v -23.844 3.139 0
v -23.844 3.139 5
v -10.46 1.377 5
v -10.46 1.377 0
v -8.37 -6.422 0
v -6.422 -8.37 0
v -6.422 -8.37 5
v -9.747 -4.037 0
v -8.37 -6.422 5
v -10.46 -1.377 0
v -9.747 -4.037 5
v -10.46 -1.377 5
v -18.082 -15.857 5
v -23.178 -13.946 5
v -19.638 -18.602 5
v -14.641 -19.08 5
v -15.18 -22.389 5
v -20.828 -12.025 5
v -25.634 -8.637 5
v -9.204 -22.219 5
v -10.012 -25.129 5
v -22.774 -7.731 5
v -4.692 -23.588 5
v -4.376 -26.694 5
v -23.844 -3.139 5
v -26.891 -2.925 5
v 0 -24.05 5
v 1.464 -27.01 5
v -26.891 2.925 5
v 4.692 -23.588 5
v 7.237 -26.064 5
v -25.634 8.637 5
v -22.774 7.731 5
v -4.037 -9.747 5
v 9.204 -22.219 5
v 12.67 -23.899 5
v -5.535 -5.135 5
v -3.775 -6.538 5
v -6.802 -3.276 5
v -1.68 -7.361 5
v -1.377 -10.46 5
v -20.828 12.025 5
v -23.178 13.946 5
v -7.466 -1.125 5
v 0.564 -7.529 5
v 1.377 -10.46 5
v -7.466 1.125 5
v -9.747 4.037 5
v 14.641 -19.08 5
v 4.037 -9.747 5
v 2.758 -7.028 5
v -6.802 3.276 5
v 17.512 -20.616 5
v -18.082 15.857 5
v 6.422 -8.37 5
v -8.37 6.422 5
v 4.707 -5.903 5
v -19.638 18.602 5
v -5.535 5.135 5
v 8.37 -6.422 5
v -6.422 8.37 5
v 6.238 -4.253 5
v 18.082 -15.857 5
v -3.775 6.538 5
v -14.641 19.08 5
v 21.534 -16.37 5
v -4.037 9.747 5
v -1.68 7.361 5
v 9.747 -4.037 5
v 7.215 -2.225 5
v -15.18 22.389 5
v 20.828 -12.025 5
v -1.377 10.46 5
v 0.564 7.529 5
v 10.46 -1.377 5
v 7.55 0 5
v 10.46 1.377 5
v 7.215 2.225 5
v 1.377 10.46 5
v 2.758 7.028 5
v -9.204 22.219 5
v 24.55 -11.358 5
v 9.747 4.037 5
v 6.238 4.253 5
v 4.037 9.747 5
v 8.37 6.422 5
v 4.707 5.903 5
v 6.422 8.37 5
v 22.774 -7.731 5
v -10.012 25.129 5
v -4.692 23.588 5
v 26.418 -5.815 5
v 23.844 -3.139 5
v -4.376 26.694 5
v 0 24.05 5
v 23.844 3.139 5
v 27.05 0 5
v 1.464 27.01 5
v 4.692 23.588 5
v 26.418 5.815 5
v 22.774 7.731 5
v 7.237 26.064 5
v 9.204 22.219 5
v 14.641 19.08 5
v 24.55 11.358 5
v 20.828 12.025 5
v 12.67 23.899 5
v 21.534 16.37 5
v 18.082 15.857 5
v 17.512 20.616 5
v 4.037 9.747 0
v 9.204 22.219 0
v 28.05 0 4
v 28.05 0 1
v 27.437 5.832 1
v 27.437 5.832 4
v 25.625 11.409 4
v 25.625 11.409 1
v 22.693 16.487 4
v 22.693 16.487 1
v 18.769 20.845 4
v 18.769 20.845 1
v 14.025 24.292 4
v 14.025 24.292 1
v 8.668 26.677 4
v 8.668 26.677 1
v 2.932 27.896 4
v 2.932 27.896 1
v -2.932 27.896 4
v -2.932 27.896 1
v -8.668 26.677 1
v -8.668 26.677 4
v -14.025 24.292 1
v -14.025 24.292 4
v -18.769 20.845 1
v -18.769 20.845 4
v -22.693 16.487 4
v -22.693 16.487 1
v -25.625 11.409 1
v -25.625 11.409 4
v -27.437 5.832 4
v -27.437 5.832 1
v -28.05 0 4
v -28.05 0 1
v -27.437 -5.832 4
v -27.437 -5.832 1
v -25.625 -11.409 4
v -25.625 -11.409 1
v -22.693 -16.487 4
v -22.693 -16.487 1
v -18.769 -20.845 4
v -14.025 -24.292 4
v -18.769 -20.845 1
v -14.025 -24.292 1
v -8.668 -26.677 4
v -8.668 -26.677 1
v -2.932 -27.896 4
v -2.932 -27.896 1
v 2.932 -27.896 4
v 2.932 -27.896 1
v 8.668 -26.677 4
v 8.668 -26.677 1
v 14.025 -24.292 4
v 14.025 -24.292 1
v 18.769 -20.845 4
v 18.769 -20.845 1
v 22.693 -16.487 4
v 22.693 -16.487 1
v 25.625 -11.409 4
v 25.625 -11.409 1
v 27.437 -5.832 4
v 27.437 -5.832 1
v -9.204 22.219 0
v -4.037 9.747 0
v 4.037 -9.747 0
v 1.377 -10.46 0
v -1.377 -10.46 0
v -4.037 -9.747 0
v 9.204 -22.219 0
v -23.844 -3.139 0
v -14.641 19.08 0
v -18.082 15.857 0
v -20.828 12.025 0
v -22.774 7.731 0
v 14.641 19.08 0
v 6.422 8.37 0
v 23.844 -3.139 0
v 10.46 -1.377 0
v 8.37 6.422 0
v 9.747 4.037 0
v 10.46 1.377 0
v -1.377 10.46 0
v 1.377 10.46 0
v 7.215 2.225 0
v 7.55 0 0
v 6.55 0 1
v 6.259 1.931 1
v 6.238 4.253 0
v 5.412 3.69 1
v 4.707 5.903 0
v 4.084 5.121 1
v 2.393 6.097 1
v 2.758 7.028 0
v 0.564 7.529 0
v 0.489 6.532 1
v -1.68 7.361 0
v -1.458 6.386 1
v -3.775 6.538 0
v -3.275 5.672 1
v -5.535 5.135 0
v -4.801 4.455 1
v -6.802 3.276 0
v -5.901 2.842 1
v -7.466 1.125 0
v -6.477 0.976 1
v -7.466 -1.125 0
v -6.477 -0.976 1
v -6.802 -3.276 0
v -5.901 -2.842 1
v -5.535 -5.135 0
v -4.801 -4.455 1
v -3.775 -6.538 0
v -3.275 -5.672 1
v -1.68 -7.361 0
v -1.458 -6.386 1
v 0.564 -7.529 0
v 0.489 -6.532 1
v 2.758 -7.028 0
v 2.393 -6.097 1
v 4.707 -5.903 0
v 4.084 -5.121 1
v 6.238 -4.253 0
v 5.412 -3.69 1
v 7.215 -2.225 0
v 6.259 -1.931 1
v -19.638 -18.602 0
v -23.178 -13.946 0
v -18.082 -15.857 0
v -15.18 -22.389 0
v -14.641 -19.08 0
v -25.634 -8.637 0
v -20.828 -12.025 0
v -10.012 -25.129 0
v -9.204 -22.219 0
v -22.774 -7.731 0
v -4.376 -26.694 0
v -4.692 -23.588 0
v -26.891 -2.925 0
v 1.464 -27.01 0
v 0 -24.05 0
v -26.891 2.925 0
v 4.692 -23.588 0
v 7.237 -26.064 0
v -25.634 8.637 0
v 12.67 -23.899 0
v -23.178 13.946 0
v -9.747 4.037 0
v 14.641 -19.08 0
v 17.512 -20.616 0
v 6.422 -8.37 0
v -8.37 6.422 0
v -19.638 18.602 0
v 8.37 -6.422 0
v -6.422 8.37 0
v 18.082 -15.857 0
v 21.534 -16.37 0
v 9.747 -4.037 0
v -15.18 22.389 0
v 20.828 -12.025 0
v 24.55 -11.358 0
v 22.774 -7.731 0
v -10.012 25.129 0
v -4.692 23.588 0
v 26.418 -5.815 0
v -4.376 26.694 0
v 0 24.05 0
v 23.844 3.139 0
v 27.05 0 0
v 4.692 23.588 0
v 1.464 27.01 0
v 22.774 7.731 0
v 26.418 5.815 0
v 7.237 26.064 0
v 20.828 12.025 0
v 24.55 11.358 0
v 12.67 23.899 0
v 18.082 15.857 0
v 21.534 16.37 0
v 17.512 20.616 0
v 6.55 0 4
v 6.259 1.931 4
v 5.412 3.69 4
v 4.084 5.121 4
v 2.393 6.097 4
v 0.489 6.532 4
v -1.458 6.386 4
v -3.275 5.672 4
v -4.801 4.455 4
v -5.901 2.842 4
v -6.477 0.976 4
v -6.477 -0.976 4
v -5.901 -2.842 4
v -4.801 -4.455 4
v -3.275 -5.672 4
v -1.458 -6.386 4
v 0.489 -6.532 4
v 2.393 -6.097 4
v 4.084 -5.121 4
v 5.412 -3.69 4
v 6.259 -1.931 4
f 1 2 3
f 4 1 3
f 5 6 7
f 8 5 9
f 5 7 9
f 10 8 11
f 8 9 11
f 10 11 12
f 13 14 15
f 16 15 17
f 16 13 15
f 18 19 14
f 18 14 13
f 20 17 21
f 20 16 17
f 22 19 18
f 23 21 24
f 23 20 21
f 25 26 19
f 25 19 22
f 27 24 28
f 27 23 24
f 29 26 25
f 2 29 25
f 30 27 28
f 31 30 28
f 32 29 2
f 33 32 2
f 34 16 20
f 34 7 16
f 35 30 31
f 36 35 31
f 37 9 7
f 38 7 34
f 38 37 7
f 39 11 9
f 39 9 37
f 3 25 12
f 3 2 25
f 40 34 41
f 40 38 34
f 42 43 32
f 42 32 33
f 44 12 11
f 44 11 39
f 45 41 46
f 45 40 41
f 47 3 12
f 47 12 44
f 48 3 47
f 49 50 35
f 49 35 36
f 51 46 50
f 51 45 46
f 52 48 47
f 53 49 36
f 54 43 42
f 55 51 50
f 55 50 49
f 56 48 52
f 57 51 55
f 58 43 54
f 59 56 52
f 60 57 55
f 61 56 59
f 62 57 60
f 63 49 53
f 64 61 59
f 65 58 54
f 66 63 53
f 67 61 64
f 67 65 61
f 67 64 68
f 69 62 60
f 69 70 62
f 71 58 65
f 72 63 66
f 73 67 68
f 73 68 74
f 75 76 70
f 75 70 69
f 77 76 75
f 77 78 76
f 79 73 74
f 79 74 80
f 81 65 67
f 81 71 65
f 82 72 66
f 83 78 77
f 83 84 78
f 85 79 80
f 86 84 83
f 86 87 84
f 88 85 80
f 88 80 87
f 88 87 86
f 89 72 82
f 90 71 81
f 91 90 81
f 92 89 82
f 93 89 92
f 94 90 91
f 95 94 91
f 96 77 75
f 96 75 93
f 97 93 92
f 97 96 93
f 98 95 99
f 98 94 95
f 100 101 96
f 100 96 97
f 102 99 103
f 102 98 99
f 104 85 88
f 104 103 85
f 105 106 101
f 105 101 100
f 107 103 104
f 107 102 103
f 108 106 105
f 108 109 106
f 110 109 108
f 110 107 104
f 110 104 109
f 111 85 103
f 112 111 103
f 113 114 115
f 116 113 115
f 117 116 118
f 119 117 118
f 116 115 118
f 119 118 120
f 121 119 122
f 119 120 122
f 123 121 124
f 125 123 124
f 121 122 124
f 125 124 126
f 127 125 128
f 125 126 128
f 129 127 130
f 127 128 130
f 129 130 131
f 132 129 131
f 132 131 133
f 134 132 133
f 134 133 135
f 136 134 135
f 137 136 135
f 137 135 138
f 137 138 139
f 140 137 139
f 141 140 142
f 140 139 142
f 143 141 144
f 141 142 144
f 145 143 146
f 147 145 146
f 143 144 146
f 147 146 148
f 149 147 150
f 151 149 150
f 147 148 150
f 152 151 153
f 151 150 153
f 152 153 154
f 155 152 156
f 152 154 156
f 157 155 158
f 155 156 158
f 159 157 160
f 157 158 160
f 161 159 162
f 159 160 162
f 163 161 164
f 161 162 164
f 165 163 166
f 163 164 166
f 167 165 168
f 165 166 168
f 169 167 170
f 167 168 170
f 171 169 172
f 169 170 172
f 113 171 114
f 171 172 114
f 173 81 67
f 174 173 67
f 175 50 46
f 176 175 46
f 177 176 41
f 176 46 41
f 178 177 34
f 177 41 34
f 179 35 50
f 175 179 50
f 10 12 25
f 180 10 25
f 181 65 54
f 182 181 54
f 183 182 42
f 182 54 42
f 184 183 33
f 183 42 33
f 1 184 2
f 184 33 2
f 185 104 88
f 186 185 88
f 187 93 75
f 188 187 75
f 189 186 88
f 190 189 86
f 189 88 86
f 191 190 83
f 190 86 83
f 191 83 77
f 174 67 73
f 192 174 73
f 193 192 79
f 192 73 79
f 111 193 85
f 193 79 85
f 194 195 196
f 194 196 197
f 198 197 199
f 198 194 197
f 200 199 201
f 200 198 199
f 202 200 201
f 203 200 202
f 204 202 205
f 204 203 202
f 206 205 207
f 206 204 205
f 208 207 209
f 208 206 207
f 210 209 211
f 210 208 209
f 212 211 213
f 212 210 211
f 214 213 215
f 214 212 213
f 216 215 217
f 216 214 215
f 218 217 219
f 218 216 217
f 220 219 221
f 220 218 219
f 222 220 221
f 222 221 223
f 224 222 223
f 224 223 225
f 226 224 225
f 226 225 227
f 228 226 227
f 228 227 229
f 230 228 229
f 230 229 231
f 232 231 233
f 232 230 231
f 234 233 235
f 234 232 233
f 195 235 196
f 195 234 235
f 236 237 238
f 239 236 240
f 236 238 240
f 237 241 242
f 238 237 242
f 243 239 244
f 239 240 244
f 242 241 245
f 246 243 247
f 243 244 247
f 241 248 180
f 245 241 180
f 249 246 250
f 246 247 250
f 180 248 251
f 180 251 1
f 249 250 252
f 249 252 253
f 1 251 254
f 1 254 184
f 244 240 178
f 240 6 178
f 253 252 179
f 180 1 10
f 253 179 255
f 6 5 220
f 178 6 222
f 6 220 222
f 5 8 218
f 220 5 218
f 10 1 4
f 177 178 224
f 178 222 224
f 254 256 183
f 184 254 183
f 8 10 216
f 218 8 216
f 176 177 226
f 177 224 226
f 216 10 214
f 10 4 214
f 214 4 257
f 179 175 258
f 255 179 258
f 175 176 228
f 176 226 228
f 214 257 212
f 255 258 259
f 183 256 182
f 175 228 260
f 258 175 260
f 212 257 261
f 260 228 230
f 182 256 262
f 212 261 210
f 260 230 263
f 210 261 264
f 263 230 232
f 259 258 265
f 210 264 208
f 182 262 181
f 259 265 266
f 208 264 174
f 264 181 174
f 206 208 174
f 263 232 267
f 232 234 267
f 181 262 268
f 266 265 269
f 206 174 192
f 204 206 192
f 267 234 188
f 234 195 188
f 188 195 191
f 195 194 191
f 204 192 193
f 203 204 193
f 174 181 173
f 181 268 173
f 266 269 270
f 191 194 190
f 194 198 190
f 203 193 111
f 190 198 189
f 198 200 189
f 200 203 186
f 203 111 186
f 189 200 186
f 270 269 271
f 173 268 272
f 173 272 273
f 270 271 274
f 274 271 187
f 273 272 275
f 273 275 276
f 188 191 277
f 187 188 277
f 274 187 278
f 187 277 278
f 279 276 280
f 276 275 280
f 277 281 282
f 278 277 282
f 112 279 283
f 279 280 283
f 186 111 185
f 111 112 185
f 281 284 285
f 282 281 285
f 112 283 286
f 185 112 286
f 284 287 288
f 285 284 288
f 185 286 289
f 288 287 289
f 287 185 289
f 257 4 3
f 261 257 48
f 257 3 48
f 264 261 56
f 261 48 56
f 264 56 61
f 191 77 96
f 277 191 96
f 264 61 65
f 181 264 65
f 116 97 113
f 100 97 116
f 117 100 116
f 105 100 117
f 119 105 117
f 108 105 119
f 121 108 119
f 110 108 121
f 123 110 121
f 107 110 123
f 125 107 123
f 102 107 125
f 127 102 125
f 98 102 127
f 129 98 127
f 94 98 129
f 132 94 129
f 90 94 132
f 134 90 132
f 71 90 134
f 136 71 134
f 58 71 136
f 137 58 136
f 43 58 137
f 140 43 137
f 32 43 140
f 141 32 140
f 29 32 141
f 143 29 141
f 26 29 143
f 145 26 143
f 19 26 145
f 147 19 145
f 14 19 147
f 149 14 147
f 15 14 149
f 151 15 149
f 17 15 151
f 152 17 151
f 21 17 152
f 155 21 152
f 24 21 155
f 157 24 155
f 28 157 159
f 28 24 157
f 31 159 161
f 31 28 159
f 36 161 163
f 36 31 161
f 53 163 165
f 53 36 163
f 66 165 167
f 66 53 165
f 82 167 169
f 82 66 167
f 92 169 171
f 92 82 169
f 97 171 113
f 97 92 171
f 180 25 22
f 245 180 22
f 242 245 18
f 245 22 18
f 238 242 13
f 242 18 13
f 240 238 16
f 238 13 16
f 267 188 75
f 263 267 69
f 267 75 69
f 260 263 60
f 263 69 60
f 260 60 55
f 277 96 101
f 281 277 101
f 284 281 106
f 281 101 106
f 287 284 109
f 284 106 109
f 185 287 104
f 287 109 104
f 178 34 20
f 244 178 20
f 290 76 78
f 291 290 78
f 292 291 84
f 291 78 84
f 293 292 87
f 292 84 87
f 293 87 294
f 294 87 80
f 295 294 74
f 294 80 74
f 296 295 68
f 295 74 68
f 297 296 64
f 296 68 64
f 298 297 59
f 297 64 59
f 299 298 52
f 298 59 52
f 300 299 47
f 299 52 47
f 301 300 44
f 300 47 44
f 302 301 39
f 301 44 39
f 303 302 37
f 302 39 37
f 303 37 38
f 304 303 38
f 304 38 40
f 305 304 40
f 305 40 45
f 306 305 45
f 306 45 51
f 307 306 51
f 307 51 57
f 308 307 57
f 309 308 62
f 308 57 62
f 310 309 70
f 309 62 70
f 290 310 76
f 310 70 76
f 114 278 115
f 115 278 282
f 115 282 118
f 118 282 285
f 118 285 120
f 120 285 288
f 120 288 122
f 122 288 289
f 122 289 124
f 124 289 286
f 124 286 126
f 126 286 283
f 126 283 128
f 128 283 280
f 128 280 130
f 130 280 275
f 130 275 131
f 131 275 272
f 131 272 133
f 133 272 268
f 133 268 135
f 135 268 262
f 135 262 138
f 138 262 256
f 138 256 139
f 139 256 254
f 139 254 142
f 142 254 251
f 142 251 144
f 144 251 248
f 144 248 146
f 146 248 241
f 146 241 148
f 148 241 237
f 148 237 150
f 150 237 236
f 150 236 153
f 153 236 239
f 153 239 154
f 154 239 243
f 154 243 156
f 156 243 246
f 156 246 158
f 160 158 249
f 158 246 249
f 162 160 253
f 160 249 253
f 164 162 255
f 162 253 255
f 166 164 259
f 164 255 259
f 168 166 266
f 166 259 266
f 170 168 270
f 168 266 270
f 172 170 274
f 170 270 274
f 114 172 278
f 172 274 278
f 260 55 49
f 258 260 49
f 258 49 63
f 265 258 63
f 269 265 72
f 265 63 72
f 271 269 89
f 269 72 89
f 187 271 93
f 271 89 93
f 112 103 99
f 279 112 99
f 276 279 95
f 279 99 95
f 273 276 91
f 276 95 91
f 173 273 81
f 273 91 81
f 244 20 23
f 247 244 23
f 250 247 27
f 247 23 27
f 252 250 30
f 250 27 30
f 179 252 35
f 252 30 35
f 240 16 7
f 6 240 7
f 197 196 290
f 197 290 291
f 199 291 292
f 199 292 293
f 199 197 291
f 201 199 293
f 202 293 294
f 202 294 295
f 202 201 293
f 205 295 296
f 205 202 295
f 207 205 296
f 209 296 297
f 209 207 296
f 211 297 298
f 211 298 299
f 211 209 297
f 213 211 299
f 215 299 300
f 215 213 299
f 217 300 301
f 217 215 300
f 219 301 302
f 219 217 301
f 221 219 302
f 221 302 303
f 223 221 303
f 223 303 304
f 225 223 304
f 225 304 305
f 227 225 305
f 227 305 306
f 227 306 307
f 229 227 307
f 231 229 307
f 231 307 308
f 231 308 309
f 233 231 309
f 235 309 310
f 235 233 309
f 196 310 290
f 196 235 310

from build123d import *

# Parameters (mm, degrees)
F1_R     = 28.05
F1_R_2   = 6.55
F2_DEPTH = 5
F3_SIZE  = 1
F5_DEPTH = 5.001


with BuildPart() as f2:
    # F1 (on Top) → F2 (new body)
    with BuildSketch(Plane.XY):
        Circle(F1_R)
        Circle(F1_R_2, mode=Mode.SUBTRACT)
    extrude(amount=F2_DEPTH)

    # F3
    f3_edges = [f2.edges().sort_by_distance(p)[0] for p in [
        (-28.05, 0, 0),
        (-28.05, 0, 5),
        (-6.55, 0, 5),
        (-6.55, 0, 0),
    ]]
    chamfer(f3_edges, length=F3_SIZE)

    # F4 (on face) → F5 (cut, through all)
    with BuildSketch(Plane.XY.offset(5)):
        with BuildLine():
            Line((4.0373102115, 9.746929068), (9.2035365484, 22.2193027569))
            ThreePointArc((9.2035365484, 22.2193027569), (0, 24.05), (-9.2035365484, 22.2193027569))
            Line((-9.2035365484, 22.2193027569), (-4.0373102115, 9.746929068))
            ThreePointArc((-4.0373102115, 9.746929068), (0, 10.55), (4.0373102115, 9.746929068))
        make_face()
        with BuildLine():
            ThreePointArc((-14.6407123677, 19.080147834), (-20.827910961, 12.025), (-23.844248916, 3.1391549229))
            Line((-23.844248916, 3.1391549229), (-10.4597432875, 1.3770513279))
            ThreePointArc((-10.4597432875, 1.3770513279), (-9.1365680099, 5.275), (-6.422433076, 8.3698777401))
            Line((-6.422433076, 8.3698777401), (-14.6407123677, 19.080147834))
        make_face()
        with BuildLine():
            ThreePointArc((-23.844248916, -3.1391549229), (-20.827910961, -12.025), (-14.6407123677, -19.080147834))
            Line((-14.6407123677, -19.080147834), (-6.422433076, -8.3698777401))
            ThreePointArc((-6.422433076, -8.3698777401), (-9.1365680099, -5.275), (-10.4597432875, -1.3770513279))
            Line((-10.4597432875, -1.3770513279), (-23.844248916, -3.1391549229))
        make_face()
        with BuildLine():
            ThreePointArc((-9.2035365484, -22.2193027569), (0, -24.05), (9.2035365484, -22.2193027569))
            Line((9.2035365484, -22.2193027569), (4.0373102115, -9.746929068))
            ThreePointArc((4.0373102115, -9.746929068), (0, -10.55), (-4.0373102115, -9.746929068))
            Line((-4.0373102115, -9.746929068), (-9.2035365484, -22.2193027569))
        make_face()
        with BuildLine():
            ThreePointArc((14.6407123677, -19.080147834), (20.827910961, -12.025), (23.844248916, -3.1391549229))
            Line((23.844248916, -3.1391549229), (10.4597432875, -1.3770513279))
            ThreePointArc((10.4597432875, -1.3770513279), (9.1365680099, -5.275), (6.422433076, -8.3698777401))
            Line((6.422433076, -8.3698777401), (14.6407123677, -19.080147834))
        make_face()
        with BuildLine():
            ThreePointArc((23.844248916, 3.1391549229), (20.827910961, 12.025), (14.6407123677, 19.080147834))
            Line((14.6407123677, 19.080147834), (6.422433076, 8.3698777401))
            ThreePointArc((6.422433076, 8.3698777401), (9.1365680099, 5.275), (10.4597432875, 1.3770513279))
            Line((10.4597432875, 1.3770513279), (23.844248916, 3.1391549229))
        make_face()
    extrude(amount=-F5_DEPTH, mode=Mode.SUBTRACT)


solid = f2.part
